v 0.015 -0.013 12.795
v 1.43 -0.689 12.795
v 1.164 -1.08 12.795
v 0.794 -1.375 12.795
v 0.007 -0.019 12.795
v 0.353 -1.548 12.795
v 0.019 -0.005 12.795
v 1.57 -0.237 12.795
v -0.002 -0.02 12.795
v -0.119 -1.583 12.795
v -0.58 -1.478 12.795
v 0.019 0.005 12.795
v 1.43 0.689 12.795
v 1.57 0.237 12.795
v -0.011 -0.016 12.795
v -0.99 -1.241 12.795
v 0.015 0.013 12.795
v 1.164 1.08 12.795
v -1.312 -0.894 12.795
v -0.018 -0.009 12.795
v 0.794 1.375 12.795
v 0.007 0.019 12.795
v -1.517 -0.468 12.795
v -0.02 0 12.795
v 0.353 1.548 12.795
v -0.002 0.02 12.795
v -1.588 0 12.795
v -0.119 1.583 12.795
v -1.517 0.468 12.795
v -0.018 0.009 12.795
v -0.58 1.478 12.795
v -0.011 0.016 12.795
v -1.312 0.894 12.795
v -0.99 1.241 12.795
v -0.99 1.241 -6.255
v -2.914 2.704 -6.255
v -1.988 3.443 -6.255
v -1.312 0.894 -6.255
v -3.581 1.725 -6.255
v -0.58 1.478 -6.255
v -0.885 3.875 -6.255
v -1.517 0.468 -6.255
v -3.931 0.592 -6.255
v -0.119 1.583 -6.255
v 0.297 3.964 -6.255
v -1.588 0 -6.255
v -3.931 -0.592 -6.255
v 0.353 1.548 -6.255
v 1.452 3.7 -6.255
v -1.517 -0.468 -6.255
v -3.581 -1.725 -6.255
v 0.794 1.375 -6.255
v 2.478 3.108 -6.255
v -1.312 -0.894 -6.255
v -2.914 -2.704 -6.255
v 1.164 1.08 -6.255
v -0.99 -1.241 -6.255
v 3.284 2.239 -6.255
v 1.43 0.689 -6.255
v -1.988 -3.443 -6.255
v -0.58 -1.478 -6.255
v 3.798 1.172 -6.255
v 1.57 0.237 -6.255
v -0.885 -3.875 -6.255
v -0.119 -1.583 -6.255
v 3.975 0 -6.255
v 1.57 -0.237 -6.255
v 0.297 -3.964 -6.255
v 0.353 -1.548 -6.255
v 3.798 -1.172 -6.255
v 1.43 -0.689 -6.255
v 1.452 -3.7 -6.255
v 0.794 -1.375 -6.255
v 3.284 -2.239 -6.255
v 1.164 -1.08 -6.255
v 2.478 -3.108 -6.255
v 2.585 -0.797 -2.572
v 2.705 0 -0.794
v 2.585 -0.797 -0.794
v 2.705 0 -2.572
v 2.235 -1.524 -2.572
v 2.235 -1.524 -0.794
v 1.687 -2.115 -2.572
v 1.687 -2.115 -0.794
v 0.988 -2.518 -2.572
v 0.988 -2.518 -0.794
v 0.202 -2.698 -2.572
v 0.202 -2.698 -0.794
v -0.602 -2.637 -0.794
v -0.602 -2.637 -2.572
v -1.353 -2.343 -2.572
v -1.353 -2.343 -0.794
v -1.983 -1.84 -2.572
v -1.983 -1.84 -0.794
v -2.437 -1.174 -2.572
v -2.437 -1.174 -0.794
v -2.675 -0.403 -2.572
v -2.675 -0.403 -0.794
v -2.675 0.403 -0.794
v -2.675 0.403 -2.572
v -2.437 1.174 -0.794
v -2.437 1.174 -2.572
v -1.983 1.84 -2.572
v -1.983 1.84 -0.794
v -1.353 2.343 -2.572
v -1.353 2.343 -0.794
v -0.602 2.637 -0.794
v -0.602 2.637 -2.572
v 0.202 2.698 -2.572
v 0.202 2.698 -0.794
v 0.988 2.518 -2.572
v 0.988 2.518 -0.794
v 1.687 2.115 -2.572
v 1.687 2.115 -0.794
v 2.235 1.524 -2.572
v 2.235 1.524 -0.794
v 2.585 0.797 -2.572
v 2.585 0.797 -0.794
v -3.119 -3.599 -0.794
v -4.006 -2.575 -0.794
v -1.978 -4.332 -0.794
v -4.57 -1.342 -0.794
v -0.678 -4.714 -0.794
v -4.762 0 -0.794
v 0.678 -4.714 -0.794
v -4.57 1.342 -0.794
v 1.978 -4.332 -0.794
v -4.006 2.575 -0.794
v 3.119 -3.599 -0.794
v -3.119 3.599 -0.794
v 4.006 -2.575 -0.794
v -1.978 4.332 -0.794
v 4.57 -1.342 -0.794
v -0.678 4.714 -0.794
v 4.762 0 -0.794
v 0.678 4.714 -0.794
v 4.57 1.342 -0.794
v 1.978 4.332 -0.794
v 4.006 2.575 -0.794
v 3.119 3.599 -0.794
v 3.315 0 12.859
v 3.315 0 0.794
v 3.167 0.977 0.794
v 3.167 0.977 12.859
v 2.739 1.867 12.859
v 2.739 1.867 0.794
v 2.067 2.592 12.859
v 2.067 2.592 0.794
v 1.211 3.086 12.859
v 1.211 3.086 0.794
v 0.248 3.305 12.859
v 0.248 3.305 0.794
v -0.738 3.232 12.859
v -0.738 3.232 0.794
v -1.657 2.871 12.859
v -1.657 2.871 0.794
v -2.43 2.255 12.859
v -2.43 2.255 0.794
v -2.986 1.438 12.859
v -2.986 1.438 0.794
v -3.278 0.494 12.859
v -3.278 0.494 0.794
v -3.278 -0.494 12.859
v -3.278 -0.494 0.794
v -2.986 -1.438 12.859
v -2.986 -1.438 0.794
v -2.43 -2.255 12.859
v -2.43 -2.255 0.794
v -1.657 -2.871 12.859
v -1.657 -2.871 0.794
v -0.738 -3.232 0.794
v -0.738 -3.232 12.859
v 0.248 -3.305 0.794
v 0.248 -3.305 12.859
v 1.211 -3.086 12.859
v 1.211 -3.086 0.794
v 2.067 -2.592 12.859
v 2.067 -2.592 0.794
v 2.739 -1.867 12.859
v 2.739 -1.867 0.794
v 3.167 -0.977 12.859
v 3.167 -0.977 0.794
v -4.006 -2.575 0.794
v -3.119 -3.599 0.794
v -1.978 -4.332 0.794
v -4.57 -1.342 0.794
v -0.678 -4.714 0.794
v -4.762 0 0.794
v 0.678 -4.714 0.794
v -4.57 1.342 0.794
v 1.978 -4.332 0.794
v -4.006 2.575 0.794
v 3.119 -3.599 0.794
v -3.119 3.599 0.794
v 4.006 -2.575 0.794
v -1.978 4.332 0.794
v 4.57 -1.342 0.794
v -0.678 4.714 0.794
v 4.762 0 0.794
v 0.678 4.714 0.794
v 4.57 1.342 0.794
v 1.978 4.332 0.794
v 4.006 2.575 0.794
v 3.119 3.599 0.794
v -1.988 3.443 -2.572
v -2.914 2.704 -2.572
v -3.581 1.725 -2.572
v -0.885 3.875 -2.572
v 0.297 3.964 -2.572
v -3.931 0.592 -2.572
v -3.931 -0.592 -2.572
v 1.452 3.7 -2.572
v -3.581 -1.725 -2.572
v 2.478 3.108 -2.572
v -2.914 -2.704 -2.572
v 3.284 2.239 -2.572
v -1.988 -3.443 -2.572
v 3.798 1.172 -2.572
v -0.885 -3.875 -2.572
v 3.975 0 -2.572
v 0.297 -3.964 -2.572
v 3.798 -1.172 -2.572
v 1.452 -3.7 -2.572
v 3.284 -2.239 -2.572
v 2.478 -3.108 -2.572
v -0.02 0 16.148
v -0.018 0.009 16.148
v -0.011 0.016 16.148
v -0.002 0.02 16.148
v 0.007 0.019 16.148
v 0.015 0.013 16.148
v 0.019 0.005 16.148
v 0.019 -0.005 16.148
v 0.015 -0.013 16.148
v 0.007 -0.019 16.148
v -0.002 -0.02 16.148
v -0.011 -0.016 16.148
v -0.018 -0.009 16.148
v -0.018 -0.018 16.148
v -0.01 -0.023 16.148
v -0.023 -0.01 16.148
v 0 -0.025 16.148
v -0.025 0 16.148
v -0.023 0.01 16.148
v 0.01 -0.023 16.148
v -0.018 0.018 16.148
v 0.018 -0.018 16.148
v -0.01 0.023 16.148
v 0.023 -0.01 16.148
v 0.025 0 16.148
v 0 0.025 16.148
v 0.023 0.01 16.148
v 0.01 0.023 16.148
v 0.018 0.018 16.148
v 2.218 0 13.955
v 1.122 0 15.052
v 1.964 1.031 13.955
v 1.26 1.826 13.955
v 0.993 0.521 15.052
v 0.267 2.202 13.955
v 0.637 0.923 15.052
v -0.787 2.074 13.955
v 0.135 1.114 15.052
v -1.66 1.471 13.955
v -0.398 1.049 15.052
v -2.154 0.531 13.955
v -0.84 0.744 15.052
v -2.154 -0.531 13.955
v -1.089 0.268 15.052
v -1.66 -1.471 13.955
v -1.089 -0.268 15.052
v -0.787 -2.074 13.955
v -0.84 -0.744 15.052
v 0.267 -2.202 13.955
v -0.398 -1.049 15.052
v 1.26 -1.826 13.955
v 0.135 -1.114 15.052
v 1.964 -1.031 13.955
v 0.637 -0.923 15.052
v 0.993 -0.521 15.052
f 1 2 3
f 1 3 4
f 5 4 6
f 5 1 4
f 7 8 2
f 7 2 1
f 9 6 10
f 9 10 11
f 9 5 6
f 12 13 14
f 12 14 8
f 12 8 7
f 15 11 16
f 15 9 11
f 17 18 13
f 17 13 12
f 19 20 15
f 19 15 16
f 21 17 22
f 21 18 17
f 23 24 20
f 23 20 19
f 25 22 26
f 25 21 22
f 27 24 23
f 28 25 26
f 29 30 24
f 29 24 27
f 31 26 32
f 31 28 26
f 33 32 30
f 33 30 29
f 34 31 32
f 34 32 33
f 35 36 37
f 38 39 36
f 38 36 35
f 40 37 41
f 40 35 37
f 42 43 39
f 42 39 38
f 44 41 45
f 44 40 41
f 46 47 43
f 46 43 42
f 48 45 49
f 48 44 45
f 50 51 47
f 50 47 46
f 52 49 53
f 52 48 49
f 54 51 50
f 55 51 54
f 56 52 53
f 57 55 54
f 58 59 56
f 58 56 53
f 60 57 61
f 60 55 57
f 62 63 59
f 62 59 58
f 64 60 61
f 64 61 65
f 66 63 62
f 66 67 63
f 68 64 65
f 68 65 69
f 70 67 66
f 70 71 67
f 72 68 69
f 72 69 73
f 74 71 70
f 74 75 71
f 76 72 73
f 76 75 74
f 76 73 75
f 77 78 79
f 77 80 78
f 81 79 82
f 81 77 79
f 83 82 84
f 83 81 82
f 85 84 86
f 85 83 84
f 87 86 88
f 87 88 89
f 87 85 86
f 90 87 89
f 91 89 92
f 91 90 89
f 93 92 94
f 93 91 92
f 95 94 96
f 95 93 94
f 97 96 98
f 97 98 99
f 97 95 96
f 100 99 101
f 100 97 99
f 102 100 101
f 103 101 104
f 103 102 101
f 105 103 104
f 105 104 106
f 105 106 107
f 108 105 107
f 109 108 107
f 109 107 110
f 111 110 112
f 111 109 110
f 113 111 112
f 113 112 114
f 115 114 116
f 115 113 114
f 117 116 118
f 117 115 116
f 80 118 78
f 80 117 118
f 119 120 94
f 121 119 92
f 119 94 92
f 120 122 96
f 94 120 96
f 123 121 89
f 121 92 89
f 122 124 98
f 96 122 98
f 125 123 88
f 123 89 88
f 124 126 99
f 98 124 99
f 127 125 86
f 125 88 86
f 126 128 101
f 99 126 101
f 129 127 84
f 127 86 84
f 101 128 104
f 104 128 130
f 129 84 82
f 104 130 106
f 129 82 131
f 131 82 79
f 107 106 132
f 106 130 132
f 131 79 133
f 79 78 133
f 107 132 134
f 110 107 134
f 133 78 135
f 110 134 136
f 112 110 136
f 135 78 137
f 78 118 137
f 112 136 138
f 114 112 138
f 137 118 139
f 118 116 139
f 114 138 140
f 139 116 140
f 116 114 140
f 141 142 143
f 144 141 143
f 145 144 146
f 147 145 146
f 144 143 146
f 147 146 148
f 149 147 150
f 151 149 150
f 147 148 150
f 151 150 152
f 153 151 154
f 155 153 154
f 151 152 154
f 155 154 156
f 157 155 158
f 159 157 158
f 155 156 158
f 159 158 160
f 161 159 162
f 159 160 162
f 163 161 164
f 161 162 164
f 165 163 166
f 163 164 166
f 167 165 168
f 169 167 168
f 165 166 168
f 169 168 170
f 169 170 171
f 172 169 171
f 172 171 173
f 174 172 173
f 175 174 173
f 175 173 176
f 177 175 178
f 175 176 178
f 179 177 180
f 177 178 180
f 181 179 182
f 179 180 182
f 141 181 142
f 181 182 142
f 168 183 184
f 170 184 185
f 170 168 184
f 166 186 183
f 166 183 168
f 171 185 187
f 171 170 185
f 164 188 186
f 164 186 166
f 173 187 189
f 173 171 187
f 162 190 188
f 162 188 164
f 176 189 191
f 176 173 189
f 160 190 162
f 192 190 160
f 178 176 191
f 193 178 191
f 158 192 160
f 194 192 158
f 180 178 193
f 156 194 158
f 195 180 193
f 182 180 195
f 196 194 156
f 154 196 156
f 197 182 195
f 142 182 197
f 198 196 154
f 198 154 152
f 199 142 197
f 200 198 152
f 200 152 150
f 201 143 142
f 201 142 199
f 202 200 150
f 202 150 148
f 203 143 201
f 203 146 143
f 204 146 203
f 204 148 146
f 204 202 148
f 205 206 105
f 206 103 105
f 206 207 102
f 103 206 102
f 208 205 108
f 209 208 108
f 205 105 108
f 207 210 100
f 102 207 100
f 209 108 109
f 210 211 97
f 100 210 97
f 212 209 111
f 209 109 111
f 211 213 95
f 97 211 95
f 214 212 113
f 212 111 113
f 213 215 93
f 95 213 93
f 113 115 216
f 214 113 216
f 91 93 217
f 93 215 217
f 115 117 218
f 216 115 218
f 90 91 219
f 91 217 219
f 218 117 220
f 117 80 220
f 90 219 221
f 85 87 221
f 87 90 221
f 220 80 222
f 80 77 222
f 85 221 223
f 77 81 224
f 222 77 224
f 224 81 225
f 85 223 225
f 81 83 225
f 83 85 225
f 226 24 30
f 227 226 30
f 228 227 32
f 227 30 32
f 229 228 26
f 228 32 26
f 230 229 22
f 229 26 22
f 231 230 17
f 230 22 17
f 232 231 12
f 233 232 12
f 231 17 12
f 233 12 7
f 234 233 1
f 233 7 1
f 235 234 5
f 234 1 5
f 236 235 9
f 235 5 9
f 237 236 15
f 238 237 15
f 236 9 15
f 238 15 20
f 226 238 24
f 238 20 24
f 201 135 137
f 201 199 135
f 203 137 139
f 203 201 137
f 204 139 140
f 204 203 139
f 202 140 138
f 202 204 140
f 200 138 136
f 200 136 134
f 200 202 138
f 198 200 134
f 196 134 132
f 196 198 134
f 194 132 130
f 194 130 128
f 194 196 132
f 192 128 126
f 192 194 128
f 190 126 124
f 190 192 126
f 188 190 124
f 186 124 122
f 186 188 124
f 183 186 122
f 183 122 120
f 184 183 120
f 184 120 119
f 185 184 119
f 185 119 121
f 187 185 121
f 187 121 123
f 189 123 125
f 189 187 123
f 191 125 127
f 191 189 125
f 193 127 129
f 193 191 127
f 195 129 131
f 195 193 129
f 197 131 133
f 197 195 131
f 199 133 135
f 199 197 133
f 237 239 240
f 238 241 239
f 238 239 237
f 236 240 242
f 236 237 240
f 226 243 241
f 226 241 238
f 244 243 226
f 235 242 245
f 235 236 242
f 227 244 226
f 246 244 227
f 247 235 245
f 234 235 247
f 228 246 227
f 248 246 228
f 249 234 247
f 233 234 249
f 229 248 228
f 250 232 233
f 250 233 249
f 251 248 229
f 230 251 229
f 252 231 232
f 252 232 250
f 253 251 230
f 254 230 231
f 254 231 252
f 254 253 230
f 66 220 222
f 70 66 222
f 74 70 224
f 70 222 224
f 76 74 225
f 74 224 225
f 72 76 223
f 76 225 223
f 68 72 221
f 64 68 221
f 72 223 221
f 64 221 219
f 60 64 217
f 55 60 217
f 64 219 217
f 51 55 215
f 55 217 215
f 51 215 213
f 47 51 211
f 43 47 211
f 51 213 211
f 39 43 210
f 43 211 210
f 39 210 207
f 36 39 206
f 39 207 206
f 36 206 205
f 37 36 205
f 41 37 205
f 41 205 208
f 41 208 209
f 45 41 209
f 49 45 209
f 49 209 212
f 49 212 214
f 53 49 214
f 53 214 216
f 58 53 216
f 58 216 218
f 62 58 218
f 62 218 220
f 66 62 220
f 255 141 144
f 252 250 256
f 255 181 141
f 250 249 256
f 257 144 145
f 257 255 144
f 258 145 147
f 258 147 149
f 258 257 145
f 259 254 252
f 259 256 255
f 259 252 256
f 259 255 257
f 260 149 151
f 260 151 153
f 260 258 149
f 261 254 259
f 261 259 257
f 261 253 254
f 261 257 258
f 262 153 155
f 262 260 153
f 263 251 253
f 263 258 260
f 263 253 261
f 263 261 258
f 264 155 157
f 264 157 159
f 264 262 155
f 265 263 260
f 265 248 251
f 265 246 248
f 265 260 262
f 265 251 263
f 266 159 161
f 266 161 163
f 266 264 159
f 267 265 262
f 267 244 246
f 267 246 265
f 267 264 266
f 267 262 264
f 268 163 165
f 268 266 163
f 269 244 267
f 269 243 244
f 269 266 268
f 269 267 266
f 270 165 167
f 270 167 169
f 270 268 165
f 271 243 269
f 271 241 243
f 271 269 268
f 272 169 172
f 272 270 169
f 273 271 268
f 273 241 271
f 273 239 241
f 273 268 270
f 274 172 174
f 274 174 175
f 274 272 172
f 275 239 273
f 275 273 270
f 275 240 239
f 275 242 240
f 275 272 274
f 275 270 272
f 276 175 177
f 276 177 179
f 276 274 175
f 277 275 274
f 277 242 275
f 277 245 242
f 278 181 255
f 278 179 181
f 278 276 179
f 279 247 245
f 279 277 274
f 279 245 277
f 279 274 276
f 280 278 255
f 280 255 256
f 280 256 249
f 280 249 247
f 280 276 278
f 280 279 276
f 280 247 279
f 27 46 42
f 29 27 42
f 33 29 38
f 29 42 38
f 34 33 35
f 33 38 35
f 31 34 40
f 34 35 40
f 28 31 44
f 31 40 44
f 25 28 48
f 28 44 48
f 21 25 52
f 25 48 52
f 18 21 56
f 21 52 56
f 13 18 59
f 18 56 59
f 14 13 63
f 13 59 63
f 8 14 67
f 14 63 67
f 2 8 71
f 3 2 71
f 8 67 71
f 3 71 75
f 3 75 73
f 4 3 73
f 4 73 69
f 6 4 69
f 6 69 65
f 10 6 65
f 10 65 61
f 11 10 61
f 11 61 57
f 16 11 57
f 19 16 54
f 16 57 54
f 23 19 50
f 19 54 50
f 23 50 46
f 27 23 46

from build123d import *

# Parameters (mm, degrees)
SKETCH1_R           = 4.7625
BOSS_EXTRUDE1_DEPTH = 0.79375
SKETCH2_R           = 3.9751
BOSS_EXTRUDE2_DEPTH = 5.461
SKETCH3_R           = 3.3147
BOSS_EXTRUDE3_DEPTH = 12.065
SKETCH6_R           = 1.5875
CUT_EXTRUDE1_DEPTH  = 19.05
SKETCH10_W          = 1.27
SKETCH10_H          = 1.778
SKETCH11_R          = 0.0508
CUT_EXTRUDE3_DEPTH  = 0.0254
SKETCH9_R           = 0.02
CUT_EXTRUDE2_DEPTH  = 23.4028


with BuildPart() as part:
    # Sketch1 → Boss-Extrude1 (new body, symmetric)
    with BuildSketch(Plane.XY):
        Circle(SKETCH1_R)
    extrude(amount=BOSS_EXTRUDE1_DEPTH, both=True)

    # Sketch2 → Boss-Extrude2 (add)
    with BuildSketch(Plane(origin=(0, 0, -0.79375), x_dir=(-1, 0, 0), z_dir=(0, 0, -1))):
        with Locations(Location((0, 0, 0), (0, 0, 180))):  # turned: the seam where the file's is
            Circle(SKETCH2_R)
    extrude(amount=BOSS_EXTRUDE2_DEPTH)

    # Sketch3 → Boss-Extrude3 (add)
    with BuildSketch(Plane.XY.offset(0.79375)):
        Circle(SKETCH3_R)
    extrude(amount=BOSS_EXTRUDE3_DEPTH)

    # Sketch5 → Revolve1 (revolve)
    with BuildSketch(Plane(origin=(0, 0, 0), x_dir=(0, 0, -1), z_dir=(1, 0, 0)), mode=Mode.PRIVATE) as revolve1_sk:
        Polygon((-12.85875, 3.3147), (-16.17345, 0), (-12.85875, 0), align=None)
    revolve(revolve1_sk.sketch.rotate(Axis((0, 0, 0), (0, 0, 1)), 270), axis=Axis((0, 0, 0), (0, 0, 1)))  # turned: the seam where the file's is

    # Sketch6 → Cut-Extrude1 (cut)
    with BuildSketch(Plane(origin=(0, 0, -6.25475), x_dir=(-1, 0, 0), z_dir=(0, 0, -1))):
        Circle(SKETCH6_R)
    extrude(amount=-CUT_EXTRUDE1_DEPTH, mode=Mode.SUBTRACT)

    # Sketch10 → Cut-Revolve1 (revolve, cut)
    with BuildSketch(Plane(origin=(0, 0, 0), x_dir=(1, 0, 0), z_dir=(0, 1, 0)), mode=Mode.PRIVATE) as cut_revolve1_sk:
        with Locations((-3.3401, 1.68275)):
            Rectangle(SKETCH10_W, SKETCH10_H)
    revolve(cut_revolve1_sk.sketch.rotate(Axis((0, 0, 0), (0, 0, -1)), 180), axis=Axis((0, 0, 0), (0, 0, -1)), mode=Mode.SUBTRACT)  # turned: the seam where the file's is

    # Sketch11 → Cut-Extrude3 (cut)
    with BuildSketch(Plane.XY.offset(16.17345)):
        Circle(SKETCH11_R)
    extrude(amount=-CUT_EXTRUDE3_DEPTH, mode=Mode.SUBTRACT)

    # Sketch9 → Cut-Extrude2 (cut, through all)
    with BuildSketch(Plane(origin=(0, 0, -6.25475), x_dir=(-1, 0, 0), z_dir=(0, 0, -1))):
        Circle(SKETCH9_R)
    extrude(amount=-CUT_EXTRUDE2_DEPTH, mode=Mode.SUBTRACT)


solid = part.part
